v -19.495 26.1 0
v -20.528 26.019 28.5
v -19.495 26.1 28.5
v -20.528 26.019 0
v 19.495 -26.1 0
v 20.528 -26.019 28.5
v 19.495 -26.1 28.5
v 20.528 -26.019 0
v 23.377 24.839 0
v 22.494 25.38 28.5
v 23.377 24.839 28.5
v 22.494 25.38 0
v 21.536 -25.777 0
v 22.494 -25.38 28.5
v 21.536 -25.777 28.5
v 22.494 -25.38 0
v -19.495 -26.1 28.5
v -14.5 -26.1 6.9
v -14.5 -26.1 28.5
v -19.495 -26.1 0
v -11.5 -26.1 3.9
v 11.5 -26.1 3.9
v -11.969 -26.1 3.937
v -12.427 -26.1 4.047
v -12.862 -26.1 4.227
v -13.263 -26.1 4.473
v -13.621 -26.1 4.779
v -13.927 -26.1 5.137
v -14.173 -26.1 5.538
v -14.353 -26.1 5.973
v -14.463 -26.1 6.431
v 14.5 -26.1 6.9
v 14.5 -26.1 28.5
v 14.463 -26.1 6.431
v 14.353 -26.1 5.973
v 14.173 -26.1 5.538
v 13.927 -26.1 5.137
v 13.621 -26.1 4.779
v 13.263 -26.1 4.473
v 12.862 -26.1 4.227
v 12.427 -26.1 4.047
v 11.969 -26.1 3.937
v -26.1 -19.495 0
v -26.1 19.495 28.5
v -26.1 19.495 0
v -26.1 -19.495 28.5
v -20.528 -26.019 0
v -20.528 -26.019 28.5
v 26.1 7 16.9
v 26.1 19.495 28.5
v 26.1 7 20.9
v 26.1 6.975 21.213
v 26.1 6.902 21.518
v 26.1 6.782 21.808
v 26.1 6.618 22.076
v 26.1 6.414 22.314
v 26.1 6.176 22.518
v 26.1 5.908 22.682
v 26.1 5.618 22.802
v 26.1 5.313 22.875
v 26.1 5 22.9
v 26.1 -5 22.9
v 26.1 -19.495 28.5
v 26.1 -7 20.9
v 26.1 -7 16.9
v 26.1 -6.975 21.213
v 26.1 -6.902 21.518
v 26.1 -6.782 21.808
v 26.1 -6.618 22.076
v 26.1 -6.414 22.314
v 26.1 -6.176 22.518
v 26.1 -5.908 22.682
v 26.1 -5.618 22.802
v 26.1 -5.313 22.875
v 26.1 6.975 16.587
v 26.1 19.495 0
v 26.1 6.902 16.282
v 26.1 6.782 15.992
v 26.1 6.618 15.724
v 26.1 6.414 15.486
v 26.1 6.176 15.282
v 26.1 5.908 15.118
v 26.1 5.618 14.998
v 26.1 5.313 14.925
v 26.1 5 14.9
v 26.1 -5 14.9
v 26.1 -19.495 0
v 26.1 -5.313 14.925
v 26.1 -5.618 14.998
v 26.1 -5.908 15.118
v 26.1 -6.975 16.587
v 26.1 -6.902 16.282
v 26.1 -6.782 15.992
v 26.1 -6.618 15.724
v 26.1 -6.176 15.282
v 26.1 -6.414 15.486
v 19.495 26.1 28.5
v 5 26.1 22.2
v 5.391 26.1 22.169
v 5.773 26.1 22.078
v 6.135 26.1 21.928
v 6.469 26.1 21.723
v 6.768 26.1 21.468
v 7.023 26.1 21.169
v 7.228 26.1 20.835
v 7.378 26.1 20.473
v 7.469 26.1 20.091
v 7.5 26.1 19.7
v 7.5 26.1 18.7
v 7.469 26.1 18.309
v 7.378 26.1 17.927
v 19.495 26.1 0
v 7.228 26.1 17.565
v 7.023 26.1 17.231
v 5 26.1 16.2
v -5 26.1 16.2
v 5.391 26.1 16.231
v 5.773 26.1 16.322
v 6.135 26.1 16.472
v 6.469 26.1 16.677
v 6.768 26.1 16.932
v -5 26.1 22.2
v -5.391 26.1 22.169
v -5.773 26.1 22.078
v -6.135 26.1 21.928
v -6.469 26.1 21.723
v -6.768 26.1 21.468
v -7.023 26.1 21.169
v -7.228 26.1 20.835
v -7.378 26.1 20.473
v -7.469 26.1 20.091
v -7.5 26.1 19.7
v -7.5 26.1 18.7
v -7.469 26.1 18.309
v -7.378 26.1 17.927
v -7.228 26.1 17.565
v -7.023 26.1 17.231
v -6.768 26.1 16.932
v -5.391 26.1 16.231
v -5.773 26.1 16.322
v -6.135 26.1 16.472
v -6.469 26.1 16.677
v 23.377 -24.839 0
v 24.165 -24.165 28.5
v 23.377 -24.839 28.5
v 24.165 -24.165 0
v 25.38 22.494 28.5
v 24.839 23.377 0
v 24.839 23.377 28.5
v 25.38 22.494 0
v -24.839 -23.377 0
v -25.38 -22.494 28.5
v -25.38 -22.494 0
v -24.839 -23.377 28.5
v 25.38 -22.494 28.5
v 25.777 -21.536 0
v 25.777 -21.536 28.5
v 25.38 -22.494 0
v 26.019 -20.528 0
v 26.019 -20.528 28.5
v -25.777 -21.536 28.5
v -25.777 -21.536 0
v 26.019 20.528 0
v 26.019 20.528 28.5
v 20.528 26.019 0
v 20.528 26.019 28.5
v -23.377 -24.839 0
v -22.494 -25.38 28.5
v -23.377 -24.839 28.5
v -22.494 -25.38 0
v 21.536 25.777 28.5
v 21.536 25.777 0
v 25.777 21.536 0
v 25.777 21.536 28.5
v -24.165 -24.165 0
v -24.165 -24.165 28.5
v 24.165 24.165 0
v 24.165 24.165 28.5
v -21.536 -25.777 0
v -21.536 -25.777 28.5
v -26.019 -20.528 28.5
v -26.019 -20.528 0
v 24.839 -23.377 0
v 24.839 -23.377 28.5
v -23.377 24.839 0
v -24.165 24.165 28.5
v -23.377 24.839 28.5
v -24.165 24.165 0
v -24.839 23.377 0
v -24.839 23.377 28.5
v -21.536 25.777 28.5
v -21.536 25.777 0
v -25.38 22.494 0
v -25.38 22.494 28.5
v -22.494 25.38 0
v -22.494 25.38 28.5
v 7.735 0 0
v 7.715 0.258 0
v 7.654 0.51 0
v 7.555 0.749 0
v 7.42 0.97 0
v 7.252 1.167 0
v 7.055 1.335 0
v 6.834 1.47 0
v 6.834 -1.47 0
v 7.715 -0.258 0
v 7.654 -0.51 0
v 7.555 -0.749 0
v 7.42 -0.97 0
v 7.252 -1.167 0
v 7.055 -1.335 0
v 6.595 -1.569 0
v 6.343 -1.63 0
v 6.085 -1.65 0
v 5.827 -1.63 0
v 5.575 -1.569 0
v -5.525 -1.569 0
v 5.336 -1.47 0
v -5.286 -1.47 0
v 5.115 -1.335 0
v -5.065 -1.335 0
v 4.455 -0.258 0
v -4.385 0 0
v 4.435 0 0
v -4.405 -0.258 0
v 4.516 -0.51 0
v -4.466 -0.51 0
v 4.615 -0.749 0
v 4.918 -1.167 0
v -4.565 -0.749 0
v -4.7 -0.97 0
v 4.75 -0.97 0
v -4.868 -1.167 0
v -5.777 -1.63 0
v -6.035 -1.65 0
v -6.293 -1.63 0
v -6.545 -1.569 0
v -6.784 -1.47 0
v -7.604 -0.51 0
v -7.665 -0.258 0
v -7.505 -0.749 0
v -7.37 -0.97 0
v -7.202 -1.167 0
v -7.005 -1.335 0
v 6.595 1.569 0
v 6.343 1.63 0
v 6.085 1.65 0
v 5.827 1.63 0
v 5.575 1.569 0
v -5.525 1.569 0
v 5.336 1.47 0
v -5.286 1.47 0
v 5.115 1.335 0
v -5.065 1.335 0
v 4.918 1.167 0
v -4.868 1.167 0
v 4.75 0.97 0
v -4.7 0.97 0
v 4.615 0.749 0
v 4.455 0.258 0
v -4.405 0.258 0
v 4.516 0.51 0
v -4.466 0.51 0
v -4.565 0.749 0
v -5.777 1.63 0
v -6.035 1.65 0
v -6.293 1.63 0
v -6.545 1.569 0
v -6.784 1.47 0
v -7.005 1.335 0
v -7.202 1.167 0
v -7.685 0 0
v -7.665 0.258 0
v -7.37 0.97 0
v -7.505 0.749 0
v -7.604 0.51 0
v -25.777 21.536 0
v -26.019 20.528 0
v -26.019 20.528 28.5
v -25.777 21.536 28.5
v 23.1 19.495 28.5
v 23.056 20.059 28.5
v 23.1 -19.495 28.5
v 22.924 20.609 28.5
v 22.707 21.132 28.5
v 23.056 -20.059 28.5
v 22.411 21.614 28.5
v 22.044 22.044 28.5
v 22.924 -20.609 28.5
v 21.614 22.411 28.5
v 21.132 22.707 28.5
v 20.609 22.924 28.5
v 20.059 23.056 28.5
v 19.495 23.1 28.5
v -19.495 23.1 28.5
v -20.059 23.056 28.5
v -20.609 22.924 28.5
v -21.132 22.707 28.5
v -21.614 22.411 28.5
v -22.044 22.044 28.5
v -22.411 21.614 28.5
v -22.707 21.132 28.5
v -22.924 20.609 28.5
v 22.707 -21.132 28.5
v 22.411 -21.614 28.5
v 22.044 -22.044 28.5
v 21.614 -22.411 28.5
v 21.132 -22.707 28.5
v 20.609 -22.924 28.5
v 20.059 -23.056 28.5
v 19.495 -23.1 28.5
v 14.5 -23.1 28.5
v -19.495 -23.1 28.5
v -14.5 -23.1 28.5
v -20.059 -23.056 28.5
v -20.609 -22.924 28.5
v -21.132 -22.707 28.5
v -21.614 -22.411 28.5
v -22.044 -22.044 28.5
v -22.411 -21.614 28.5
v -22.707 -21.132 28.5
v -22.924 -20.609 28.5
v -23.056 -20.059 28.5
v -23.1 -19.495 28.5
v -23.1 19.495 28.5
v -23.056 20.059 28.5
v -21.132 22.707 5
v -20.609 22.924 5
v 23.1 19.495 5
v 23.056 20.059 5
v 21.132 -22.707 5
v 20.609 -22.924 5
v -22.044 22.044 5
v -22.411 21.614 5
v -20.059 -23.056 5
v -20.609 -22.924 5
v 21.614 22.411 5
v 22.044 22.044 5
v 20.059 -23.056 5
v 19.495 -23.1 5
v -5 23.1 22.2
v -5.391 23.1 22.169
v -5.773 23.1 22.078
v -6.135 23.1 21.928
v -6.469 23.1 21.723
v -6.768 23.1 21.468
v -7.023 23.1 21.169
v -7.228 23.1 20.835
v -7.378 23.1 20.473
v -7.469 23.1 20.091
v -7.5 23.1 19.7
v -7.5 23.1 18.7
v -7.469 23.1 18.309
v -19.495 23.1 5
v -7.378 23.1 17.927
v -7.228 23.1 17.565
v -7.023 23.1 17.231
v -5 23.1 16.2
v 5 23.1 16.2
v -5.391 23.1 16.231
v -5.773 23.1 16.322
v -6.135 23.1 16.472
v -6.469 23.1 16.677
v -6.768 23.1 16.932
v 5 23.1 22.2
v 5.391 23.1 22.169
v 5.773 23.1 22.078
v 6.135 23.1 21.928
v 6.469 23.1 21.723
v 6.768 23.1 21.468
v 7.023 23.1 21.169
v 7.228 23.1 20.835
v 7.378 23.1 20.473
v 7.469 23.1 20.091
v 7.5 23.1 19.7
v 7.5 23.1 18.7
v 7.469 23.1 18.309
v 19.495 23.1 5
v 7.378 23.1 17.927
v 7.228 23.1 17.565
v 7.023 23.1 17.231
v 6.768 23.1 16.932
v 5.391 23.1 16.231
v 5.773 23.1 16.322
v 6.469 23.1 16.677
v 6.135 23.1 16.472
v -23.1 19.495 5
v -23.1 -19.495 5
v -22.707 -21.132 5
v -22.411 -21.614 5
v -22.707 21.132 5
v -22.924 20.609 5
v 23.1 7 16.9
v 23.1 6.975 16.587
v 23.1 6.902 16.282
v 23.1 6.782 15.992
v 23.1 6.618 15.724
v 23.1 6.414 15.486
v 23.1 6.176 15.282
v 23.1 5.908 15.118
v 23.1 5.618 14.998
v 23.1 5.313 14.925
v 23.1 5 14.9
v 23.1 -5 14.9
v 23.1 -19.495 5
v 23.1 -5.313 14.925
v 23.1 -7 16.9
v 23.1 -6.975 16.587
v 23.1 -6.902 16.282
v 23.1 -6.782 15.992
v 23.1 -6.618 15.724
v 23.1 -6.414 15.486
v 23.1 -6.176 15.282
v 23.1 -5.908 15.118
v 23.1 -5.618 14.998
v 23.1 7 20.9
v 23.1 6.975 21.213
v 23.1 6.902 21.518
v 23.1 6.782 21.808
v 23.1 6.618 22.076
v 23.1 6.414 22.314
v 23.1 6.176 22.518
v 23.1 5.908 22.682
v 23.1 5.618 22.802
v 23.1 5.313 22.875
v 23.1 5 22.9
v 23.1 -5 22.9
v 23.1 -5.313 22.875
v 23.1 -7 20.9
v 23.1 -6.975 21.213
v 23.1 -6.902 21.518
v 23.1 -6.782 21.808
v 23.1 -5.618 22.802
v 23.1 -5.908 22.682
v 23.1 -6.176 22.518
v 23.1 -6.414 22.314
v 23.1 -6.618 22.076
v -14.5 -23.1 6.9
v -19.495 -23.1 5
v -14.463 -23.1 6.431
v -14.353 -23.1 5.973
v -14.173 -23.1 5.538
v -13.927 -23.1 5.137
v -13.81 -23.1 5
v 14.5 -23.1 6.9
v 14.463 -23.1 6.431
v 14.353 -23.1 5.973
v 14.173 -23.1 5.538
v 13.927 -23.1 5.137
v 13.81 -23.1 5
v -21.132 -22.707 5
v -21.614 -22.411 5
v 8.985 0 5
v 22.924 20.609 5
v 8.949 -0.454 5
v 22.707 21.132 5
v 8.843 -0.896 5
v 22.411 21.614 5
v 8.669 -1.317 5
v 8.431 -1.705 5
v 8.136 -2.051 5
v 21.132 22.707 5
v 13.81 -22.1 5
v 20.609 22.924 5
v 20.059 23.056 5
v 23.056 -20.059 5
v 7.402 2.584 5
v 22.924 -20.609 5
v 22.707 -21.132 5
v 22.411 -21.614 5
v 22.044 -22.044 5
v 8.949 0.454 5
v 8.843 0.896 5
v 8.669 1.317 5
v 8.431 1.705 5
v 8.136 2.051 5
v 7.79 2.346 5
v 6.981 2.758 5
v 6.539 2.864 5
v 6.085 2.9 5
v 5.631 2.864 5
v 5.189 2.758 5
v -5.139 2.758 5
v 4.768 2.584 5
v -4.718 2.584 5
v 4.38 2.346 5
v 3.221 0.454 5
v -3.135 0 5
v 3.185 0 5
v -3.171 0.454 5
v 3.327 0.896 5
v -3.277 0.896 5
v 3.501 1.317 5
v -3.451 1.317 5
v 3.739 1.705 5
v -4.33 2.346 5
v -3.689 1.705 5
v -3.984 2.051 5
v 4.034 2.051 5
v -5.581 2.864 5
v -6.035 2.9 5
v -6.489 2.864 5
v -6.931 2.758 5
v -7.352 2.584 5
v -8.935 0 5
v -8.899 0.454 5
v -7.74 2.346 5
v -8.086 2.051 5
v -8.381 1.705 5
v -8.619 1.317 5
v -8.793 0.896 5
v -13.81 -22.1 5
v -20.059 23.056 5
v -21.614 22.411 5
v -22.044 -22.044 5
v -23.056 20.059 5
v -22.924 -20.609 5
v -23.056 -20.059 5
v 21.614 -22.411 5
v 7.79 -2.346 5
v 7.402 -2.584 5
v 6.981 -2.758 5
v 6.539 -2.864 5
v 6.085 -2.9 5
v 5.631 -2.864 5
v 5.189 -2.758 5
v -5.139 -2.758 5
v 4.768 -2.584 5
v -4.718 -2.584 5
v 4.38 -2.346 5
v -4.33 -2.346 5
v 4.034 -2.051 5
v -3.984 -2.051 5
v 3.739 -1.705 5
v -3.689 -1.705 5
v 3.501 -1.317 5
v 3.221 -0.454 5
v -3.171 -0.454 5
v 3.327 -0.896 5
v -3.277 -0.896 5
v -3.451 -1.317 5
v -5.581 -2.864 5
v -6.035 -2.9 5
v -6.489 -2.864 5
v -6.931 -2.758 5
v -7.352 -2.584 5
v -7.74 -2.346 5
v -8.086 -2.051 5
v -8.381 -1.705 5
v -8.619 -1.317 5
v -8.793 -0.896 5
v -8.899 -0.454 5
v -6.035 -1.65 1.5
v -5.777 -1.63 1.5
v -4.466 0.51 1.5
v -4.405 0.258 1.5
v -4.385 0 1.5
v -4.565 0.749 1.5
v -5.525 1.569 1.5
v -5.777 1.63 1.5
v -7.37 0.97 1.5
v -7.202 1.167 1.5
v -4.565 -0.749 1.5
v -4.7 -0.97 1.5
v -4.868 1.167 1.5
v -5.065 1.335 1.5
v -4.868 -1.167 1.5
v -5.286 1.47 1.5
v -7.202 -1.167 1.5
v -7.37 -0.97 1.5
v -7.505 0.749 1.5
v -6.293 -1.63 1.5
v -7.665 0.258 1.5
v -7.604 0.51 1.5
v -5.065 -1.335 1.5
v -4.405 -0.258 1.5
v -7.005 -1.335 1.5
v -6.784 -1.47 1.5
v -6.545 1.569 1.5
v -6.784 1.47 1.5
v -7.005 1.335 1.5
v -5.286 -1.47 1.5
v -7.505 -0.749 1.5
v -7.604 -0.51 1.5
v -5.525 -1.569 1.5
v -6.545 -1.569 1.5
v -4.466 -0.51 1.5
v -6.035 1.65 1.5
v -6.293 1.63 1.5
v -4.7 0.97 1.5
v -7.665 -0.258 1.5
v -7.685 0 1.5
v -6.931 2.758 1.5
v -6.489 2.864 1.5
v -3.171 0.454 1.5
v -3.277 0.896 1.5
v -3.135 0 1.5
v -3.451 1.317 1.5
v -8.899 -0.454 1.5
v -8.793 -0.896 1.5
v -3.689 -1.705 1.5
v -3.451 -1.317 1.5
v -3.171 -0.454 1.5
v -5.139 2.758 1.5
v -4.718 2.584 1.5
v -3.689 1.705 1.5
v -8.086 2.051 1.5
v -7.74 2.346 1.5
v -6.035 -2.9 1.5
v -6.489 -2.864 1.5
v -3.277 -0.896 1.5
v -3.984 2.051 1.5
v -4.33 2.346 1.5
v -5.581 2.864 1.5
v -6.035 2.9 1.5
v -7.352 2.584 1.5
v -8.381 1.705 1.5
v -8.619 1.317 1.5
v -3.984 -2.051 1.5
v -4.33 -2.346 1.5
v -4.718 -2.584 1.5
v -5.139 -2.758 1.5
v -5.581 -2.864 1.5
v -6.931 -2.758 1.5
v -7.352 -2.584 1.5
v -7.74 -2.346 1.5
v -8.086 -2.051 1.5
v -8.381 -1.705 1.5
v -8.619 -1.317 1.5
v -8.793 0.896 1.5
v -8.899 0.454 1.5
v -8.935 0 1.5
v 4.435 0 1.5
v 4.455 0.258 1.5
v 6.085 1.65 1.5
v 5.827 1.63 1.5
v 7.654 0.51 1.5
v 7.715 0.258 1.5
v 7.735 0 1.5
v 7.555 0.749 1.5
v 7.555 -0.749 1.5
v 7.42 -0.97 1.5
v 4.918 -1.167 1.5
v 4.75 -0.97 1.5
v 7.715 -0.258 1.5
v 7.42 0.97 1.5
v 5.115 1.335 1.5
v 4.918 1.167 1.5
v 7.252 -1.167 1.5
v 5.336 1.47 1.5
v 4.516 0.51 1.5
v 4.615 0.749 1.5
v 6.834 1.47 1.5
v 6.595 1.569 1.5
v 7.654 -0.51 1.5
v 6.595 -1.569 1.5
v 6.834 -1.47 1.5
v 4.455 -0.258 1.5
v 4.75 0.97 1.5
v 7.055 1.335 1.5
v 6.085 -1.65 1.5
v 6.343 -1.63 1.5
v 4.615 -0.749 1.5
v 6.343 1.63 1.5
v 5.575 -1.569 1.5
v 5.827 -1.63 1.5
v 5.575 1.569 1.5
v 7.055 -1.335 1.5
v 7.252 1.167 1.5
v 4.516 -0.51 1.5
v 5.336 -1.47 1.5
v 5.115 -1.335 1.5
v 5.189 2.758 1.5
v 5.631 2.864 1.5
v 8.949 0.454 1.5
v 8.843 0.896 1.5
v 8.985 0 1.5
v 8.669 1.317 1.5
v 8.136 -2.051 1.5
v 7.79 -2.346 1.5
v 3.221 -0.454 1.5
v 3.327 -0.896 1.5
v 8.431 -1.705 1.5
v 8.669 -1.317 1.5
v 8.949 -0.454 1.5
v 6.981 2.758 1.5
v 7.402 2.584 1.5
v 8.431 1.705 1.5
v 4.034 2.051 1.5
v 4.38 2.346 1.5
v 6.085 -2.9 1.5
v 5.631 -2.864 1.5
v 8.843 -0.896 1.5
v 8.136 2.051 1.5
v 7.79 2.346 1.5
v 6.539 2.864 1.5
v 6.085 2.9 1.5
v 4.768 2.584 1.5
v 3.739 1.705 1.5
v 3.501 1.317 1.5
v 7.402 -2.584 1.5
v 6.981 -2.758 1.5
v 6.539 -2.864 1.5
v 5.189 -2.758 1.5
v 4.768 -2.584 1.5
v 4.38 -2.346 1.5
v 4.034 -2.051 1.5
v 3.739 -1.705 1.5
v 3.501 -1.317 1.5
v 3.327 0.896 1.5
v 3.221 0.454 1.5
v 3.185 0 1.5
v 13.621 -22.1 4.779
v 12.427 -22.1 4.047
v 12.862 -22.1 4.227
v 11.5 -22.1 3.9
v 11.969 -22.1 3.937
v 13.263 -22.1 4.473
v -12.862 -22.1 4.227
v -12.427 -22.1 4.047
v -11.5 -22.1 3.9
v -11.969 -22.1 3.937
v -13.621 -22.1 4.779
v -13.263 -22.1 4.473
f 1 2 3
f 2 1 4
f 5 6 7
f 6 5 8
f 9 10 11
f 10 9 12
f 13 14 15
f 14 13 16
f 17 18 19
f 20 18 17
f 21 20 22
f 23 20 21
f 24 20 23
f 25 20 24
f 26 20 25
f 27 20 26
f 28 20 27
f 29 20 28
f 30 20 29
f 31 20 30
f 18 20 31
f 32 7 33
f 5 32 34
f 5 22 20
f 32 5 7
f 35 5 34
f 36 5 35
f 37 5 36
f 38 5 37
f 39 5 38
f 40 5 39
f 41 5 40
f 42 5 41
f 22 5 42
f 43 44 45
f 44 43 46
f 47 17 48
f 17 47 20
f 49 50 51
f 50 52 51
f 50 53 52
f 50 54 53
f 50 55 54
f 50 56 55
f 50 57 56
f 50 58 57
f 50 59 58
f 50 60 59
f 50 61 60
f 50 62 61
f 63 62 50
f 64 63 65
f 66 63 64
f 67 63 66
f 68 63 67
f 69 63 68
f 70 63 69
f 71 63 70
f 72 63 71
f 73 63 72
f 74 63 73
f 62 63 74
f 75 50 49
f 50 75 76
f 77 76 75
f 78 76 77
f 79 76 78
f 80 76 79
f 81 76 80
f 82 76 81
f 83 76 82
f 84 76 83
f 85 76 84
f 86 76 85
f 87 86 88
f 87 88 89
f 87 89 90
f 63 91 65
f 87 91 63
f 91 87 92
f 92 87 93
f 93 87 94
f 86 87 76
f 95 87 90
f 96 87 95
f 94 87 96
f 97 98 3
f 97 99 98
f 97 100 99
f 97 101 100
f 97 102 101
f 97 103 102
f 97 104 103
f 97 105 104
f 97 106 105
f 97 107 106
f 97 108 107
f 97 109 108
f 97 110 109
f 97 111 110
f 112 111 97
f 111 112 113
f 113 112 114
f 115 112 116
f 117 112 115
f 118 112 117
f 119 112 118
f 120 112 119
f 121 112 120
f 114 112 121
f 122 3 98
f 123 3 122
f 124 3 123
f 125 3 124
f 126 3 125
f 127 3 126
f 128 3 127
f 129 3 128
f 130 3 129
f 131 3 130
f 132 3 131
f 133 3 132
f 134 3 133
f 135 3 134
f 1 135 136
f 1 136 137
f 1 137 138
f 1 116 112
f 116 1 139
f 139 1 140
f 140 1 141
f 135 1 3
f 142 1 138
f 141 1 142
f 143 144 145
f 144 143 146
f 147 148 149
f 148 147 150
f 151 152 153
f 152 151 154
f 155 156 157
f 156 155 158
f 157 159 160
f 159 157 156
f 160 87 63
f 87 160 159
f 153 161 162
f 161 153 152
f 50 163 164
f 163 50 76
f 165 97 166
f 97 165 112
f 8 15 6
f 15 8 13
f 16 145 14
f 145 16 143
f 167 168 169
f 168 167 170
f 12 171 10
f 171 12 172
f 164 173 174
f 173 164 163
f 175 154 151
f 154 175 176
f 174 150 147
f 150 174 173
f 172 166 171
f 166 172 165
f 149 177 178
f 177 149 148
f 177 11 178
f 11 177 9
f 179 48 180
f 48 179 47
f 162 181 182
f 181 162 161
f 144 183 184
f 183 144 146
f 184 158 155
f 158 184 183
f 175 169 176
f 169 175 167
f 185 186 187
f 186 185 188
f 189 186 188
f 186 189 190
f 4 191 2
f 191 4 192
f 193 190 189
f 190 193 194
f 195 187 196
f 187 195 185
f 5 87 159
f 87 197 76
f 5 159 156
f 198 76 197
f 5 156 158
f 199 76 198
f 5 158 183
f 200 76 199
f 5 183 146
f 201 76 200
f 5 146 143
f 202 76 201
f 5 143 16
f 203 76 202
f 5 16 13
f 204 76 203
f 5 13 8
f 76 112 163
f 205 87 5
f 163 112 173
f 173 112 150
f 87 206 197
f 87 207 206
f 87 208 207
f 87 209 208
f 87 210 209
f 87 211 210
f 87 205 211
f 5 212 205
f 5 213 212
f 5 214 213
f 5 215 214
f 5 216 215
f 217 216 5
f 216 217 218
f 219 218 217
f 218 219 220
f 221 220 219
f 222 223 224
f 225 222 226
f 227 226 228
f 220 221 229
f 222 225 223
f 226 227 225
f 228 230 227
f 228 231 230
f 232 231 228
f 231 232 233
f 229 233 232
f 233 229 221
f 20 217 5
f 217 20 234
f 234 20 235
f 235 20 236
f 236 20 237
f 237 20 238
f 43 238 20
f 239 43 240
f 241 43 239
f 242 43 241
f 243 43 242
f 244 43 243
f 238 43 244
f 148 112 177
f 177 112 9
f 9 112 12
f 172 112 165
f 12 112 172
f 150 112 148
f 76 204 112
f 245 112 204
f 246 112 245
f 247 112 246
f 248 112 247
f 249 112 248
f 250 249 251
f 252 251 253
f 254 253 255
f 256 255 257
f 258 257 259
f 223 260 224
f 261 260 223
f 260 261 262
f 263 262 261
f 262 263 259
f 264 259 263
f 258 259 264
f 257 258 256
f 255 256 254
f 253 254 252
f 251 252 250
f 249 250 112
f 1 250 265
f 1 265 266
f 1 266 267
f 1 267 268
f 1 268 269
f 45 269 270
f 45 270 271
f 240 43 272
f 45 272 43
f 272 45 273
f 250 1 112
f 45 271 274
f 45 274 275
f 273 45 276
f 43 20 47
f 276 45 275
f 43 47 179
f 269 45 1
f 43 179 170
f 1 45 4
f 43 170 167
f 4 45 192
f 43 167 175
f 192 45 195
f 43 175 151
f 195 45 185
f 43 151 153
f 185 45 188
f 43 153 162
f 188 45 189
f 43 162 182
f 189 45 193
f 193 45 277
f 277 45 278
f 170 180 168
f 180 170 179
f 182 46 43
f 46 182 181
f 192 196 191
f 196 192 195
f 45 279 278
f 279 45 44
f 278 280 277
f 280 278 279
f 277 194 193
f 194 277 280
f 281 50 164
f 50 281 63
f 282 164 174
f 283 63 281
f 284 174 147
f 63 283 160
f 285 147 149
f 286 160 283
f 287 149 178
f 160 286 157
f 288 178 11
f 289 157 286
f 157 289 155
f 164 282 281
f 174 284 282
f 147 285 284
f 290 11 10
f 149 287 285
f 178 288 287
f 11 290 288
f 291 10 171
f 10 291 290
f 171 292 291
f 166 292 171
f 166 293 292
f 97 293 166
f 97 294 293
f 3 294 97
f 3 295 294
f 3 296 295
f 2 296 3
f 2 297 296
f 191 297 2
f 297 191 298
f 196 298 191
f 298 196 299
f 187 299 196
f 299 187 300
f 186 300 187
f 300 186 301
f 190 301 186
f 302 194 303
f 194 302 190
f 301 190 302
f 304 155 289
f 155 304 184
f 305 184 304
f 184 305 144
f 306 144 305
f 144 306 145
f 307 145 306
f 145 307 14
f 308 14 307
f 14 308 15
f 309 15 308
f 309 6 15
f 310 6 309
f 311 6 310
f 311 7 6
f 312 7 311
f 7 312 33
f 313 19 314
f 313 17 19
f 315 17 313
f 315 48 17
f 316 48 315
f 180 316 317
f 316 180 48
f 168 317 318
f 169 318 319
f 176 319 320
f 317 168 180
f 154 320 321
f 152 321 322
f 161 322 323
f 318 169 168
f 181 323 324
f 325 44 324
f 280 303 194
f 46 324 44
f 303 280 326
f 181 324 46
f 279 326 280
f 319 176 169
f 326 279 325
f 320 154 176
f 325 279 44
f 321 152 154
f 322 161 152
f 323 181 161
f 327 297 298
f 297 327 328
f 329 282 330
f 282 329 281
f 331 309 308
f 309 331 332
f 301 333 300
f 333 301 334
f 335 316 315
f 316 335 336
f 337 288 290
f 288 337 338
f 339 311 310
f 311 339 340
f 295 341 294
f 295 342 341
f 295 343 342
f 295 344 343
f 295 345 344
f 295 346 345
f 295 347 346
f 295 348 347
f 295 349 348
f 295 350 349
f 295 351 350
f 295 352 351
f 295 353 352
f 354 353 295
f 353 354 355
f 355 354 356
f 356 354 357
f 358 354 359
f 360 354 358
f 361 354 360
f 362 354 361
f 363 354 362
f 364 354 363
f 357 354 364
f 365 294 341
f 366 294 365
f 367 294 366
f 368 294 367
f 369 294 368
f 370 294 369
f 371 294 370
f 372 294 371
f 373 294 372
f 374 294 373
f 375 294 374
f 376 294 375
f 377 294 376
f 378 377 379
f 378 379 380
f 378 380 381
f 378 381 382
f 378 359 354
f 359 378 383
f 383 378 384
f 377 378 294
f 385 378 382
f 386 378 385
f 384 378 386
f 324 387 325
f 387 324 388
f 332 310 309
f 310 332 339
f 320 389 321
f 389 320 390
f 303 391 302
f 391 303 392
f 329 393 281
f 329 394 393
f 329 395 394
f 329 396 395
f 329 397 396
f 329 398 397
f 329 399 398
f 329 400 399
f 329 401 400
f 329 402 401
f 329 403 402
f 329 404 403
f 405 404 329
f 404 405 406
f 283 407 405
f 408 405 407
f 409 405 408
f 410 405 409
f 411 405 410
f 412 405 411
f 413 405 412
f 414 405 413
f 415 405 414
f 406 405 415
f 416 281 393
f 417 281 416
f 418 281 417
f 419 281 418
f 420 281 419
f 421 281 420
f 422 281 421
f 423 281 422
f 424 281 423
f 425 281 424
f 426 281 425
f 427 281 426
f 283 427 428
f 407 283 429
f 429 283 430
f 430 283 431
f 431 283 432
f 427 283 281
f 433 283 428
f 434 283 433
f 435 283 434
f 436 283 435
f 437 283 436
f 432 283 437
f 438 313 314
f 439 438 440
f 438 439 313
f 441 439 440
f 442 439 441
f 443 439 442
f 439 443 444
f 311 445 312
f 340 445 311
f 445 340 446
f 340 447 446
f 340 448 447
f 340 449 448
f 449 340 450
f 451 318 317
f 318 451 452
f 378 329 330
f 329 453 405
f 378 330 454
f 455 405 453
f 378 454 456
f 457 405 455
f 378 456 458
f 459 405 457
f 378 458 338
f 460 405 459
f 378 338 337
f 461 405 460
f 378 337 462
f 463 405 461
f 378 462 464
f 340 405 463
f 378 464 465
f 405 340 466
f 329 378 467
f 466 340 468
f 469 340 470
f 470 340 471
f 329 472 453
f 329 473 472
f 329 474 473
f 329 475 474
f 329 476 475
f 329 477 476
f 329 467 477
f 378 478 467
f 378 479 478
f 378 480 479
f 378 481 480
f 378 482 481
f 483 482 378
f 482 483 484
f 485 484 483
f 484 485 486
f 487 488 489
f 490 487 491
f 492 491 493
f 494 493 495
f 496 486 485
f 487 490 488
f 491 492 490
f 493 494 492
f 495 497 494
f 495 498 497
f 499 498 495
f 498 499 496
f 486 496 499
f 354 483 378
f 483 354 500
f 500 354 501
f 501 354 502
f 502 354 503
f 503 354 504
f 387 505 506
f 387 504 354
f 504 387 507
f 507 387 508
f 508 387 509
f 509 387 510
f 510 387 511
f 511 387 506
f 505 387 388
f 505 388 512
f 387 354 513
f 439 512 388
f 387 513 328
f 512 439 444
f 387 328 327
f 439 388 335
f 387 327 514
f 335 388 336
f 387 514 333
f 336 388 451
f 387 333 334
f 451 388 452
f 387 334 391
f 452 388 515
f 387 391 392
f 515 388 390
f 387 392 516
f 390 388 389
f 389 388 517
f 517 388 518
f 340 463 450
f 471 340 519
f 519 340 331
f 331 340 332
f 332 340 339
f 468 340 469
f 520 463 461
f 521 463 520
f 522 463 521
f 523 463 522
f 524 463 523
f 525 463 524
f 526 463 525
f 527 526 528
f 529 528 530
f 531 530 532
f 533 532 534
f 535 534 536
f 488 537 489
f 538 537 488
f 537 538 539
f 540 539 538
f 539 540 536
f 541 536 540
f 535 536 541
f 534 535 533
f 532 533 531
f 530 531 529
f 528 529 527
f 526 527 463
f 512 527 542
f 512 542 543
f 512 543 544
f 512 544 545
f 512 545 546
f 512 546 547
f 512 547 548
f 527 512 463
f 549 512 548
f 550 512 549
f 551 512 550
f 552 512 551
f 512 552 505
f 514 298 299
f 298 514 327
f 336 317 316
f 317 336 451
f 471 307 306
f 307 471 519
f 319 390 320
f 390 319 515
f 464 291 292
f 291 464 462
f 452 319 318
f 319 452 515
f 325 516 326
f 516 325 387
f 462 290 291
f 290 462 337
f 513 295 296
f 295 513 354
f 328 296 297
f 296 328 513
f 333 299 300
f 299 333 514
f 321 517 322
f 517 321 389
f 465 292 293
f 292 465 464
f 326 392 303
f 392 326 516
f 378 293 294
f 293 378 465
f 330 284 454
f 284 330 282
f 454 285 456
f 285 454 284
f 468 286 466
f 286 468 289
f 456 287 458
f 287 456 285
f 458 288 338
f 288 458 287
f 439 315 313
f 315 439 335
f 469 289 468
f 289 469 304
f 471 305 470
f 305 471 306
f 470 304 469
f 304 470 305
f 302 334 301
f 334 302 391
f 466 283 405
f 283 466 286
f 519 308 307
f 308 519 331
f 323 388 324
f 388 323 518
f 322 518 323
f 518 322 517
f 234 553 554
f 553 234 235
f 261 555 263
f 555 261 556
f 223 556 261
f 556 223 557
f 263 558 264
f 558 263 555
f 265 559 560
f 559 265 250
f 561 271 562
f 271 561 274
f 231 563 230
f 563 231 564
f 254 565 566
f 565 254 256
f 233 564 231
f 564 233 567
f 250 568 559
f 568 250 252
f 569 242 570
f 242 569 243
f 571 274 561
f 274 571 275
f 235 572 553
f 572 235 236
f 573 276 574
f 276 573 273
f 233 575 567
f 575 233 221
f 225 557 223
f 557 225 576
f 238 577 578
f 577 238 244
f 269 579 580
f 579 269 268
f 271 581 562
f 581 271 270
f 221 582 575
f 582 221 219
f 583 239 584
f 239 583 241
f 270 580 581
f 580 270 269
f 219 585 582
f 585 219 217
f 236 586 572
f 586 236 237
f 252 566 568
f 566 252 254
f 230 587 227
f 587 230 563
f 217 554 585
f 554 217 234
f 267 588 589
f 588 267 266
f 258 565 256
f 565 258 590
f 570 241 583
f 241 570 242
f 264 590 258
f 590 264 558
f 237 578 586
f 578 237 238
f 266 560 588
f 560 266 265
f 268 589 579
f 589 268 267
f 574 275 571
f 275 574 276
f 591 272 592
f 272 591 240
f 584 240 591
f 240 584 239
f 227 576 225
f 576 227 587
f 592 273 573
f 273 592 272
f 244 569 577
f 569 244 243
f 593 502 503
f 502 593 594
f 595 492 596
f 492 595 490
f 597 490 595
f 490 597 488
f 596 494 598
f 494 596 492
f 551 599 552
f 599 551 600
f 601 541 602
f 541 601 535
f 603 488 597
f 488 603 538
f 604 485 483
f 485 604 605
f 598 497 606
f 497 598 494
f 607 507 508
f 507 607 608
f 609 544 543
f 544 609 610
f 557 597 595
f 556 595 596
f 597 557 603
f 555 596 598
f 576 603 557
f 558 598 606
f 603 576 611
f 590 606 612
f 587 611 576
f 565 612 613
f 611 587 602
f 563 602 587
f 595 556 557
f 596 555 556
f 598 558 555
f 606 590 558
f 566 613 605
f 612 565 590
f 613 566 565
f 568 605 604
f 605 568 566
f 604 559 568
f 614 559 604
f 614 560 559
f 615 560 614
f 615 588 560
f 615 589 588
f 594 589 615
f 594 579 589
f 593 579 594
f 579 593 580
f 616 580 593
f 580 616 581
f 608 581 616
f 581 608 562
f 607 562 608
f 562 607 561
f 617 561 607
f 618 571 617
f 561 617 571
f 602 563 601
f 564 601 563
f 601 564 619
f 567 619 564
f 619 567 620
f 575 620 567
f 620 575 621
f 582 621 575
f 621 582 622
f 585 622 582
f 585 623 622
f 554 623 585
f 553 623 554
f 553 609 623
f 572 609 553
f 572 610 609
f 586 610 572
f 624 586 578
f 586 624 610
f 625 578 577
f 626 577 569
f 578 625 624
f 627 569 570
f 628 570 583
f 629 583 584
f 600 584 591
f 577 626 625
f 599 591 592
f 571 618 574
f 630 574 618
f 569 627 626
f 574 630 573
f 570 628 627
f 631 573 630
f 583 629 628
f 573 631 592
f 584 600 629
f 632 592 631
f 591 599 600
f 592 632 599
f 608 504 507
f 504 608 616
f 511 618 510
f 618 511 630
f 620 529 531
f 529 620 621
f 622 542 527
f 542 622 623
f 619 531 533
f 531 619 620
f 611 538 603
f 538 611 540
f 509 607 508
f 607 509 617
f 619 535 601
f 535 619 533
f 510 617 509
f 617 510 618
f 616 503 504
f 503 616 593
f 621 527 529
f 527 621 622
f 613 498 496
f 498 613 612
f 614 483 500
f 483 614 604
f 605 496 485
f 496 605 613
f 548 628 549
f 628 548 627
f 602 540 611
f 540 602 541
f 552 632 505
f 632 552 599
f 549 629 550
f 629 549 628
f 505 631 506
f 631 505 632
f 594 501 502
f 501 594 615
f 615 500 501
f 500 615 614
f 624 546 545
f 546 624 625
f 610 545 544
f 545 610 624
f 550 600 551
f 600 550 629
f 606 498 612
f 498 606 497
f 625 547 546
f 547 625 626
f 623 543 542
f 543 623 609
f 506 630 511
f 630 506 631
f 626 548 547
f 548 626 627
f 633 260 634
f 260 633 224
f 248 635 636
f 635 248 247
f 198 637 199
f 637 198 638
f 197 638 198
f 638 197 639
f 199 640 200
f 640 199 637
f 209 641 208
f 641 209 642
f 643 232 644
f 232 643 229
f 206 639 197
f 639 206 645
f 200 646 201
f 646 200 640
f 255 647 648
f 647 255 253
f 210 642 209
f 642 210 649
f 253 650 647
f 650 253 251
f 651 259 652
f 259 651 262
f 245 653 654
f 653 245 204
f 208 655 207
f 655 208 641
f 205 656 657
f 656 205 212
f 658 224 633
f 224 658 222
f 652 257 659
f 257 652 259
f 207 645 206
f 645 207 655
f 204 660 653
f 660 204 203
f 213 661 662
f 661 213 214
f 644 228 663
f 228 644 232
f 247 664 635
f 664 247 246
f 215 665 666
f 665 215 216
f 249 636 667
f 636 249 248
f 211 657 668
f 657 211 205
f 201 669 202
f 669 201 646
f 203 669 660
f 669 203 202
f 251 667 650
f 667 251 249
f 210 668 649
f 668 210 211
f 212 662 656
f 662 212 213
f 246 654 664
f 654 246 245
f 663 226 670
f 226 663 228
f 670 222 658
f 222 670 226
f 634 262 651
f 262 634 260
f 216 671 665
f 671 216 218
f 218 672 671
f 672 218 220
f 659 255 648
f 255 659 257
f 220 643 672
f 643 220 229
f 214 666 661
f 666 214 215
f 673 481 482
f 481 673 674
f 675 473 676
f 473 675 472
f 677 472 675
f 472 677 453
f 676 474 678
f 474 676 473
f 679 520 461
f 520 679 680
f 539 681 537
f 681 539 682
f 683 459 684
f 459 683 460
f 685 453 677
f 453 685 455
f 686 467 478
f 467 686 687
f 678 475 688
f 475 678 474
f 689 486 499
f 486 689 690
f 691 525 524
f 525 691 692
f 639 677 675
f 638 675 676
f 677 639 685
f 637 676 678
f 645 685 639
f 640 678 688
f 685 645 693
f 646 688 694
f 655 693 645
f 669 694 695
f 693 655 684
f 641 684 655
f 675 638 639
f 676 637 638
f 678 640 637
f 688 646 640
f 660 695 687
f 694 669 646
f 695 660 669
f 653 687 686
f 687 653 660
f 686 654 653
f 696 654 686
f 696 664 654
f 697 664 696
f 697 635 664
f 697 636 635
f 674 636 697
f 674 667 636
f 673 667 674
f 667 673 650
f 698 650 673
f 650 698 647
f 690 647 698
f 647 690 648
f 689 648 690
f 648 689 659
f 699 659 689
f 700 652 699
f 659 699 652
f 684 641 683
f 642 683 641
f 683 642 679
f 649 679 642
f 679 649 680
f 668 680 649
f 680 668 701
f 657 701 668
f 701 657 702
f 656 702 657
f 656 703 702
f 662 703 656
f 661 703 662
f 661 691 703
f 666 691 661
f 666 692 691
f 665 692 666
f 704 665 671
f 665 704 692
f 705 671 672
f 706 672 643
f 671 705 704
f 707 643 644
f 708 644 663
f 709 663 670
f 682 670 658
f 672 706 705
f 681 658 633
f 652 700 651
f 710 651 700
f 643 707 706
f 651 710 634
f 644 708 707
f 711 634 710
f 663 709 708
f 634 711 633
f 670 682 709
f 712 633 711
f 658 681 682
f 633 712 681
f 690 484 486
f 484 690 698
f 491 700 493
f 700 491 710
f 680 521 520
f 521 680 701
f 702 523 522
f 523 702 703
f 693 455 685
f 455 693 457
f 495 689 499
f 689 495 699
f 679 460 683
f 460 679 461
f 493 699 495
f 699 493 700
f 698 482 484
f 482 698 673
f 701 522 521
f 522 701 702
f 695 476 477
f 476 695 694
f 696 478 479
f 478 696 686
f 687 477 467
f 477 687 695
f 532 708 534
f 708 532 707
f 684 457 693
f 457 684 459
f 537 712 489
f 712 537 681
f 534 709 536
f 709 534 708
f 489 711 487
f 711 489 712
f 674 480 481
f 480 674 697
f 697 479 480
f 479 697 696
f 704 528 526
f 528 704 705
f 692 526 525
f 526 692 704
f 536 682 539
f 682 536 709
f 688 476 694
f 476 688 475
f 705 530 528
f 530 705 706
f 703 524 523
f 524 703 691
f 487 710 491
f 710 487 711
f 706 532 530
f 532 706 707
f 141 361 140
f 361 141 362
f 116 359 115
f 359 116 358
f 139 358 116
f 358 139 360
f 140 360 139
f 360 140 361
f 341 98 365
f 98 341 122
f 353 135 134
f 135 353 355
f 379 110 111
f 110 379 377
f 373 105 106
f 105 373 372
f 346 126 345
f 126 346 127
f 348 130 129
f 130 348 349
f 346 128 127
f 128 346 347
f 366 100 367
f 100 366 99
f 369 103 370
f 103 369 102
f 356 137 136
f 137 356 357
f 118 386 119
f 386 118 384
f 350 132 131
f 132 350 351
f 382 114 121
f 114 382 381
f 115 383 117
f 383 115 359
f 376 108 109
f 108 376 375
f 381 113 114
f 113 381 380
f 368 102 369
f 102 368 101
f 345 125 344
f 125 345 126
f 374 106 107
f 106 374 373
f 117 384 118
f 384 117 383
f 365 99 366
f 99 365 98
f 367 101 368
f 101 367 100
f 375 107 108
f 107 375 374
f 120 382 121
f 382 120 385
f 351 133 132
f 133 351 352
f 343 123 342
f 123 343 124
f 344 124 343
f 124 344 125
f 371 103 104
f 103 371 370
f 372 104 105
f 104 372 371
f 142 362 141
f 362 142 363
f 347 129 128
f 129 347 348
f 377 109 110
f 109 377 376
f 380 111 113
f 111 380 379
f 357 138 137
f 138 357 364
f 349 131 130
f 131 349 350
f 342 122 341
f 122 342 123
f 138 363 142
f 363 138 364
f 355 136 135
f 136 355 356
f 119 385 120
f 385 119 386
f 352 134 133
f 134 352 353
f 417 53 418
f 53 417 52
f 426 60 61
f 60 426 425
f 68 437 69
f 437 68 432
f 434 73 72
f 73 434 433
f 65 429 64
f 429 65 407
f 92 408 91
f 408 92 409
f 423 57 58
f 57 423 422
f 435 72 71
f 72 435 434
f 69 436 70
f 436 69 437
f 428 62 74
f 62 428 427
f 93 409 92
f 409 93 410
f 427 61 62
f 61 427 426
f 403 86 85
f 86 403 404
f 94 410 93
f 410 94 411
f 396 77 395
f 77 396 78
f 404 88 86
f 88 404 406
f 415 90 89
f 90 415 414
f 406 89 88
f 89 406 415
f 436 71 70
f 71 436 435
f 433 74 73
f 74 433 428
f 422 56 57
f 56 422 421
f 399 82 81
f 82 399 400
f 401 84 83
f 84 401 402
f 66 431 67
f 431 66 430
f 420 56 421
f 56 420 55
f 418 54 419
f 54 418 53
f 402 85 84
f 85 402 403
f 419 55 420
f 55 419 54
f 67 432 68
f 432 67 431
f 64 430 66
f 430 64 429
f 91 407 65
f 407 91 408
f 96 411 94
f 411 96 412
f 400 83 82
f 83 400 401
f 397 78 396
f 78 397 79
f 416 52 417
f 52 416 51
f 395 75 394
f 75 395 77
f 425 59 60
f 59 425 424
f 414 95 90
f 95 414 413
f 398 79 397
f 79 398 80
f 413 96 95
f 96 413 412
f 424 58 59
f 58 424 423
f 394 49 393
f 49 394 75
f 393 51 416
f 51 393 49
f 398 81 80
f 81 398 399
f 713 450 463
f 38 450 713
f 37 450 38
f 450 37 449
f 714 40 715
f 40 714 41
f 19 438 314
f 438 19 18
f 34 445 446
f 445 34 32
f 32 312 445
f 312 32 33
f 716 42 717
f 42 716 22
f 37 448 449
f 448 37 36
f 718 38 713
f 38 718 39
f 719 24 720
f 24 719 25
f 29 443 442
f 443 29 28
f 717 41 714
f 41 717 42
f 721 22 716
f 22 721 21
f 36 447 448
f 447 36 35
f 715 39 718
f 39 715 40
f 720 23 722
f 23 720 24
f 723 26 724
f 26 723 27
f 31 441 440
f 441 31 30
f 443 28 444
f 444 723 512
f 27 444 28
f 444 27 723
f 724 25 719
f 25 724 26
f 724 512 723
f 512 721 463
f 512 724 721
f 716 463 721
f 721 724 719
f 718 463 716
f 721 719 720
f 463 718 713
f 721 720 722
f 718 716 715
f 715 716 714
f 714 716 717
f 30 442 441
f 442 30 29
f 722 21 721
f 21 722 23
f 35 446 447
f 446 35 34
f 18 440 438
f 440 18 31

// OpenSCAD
/*
  Cold-shoe mount for a 43.3 x 43.3 x 22.5 mm device
  (rounded corners; straight edge between them is 38.99 mm)

  Two printed parts, selected with `part`:
    1 = shoe_mount()    the cold shoe mount: 25 x 30 plate, 3.5 mm capture
                        lip, M3 tap recess in the middle
    2 = pocket()        the pocket the device drops into; grips the device
                        by friction fit
    3 = both, assembled

  How it holds:
    - the device drops into the pocket from the top (screen facing up) and
      is gripped by the walls (friction fit, set with `fit`)
    - the pocket is screwed to the mount with one M3 SHCS: its head sits
      recessed in the pocket floor (below the device) and its tip threads
      into a blind tap recess in the mount's top face

  Assembly order:
    1. tap the recess in the mount with an M3 tap
    2. seat the mount in the camera cold shoe (lip end first)
    3. place the pocket on the mount and screw in the M3 SHCS from above
       (the head recesses into the floor, flush below where the device sits)
    4. drop the device into the pocket

  Tuning the fit: FDM printers usually run slightly large, so the default
    fit = -0.2 (pocket 0.1 mm smaller per side than the device) typically
    lands as a tight friction fit you can push in by hand and pull out
    with a firm tug. If your printer runs small, try 0 (line-to-line) or
    0.2 (loose drop-in).

  Printing: each part prints with its flat face down, no supports needed.

  Wall layout (top view, screen facing up):
    front (-y) : 3 buttons      back (+y) : microSD slot
    left  (-x) : plain          right (+x): USB-C
  The shoe lip is on the USB side by default; flip it with lip_side.
*/

$fn = 40;

// ================= Part selector =================
part = 2;   // 1 = cold shoe mount, 2 = pocket, 3 = both

// ================= Device =================
obj_w     = 46.6;    // width
obj_d     = 46.6;    // depth
obj_h     = 22.5;    // height
obj_flat  = 38.99;   // straight edge between the rounded corners
obj_r     = (obj_w - obj_flat) / 2;   // device corner radius (2.155)

// ================= Pocket (part 2) =================
// Friction fit: 0 = line-to-line, negative = interference (grip),
// positive = clearance (loose). See the note above.
fit     = -0.2;
wall_t  = 3;         // wall thickness
floor_t = 5;         // pocket floor thickness (thick enough for a blind head recess)
wall_lip = 1;        // wall height above the device top (grip lip)

inner_w = obj_w + 2 * fit;
inner_d = obj_d + 2 * fit;
outer_w = inner_w + 2 * wall_t;
outer_d = inner_d + 2 * wall_t;
inner_r = obj_r + fit;
outer_r = inner_r + wall_t;
wall_h  = obj_h + wall_lip;   // wall height above the floor's top face

// --- access cutouts -----------------------------------------------------
// each cutout: [width, height, height of its centre from the device top,
//               offset of its centre along the wall from the wall's centre]
usb_cut = [14, 8, 8.6, 0];    // USB-C, right wall (+x)
usb_r   = 2;                  // USB-C window corner radius (rounded rectangle)
sd_cut  = [15, 6, 8.3, 0];    // microSD slot, back wall (+y) - widened for easy removal
sd_r    = 2.5;                // microSD window corner radius (rounded rectangle)

// one large rounded-rect window covering the whole button row, front wall (-y):
//   width  = 2 pitches (10 mm) + 6 mm = 26 mm
//   height = twice the old single holes (6 mm -> 12 mm), centred on the buttons
btn_win_w  = 29;
btn_win_h  = 28;
btn_win_r  = 3;               // corner radius
btn_z      = 9.6;             // window centre = button centre, measured down from the device top
btn_pitch  = 10;              // button pitch (useful when tuning the window width)

// --- joint to the cold shoe mount ---------------------------------------
// One M3 SHCS joins the pocket to the mount: head recessed in the pocket
// floor (below the device), tip threaded into a blind tap recess in the mount.
tap_d        = 2.6;         // mount tap recess: M3 (3.0 for a self-tapper)
tap_dep      = 2.0;         // tap-recess depth into the mount plate
screw_hole_d = 3.3;         // shank clearance hole through the pocket floor
csbore_d     = 5.8;         // head-recess (counterbore) diameter
screw_head_h = 2.5;         // M3 SHCS head height
screw_recess = 1.0;         // head top sits this far BELOW the floor's top face
csbore_t     = screw_head_h + screw_recess;  // head-recess depth (blind, not through)

// ================= Cold shoe mount (part 1) =================
base_w   = 25;
base_d   = 30;
base_t   = 3;
lip_h    = 3.5;    // capture-lip height (camera-shoe standard)
lip_len  = 2;      // lip depth along the plate
base_r   = 1;      // plate corner round
lip_side = 1;      // 1 = lip on the +y (USB) side, -1 = on the -y (button) side

// ================= Helpers =================

// 2D rounded rectangle, w x d, corner radius r, centred on the origin
module rounded_rect(w, d, r) {
  union() {
    square([w - 2 * r, d], true);
    square([w, d - 2 * r], true);
    for (sx = [-1, 1])
      for (sy = [-1, 1])
        translate([sx * (w / 2 - r), sy * (d / 2 - r)])
          circle(r);
  }
}

// ================= Part 1: cold shoe mount =================
module shoe_mount() {
  difference() {
    union() {
      // main plate
      linear_extrude(base_t)
        rounded_rect(base_w, base_d, base_r);
      // capture lip: 0.5 mm proud band on one end of the plate
      translate([0, lip_side * (base_d / 2 - lip_len / 2), lip_h / 2])
        cube([base_w, lip_len, lip_h], true);
    }
    // blind M3 tap recess in the top face: the screw tip seats flush in this
    translate([0, 0, base_t - tap_dep])
      cylinder(h = tap_dep, d = tap_d);
  }
}

// ================= Part 2: pocket =================
module pocket() {
  difference() {
    union() {
      // floor
      linear_extrude(floor_t)
        rounded_rect(outer_w, outer_d, outer_r);
      // walls, rising from the floor's top face
      translate([0, 0, floor_t])
        linear_extrude(wall_h)
          rounded_rect(outer_w, outer_d, outer_r);
    }

    // the pocket cavity the device drops into, open at the top
    translate([0, 0, floor_t])
      linear_extrude(wall_h)
        rounded_rect(inner_w, inner_d, inner_r);

    // shank clearance hole through the floor, plus a blind head recess at the
    // top face (the screw head sits recessed in it, below the device)
    translate([-5.91-0.125, 0, 0])
    cylinder(h = floor_t, d = screw_hole_d);
    translate([-5.91-0.125, 0, floor_t - csbore_t])
      cylinder(h = csbore_t, d = csbore_d);


   // shank clearance hole through the floor, plus a blind head recess at the
    // top face (the screw head sits recessed in it, below the device)
    translate([5.91+0.125+0.05, 0, 0])
    cylinder(h = floor_t, d = screw_hole_d);
    translate([5.91+0.125+0.05, 0, floor_t - csbore_t])
      cylinder(h = csbore_t, d = csbore_d);

    // microSD slot cutout, back wall (+y): rounded rectangle
    translate([sd_cut[3], inner_d / 2 - 1, floor_t + (obj_h - sd_cut[2])])
      rotate([-90, 0, 0])
        linear_extrude(wall_t + 2)
          rounded_rect(sd_cut[0], sd_cut[1], sd_r);

    // USB-C cutout, right wall (+x): rounded rectangle
    translate([4+ inner_d / 2, usb_cut[3], floor_t + (obj_h - usb_cut[2])])
      rotate([90, 0, 0])
        rotate([0, -90, 0])
          linear_extrude(wall_t + 2)
            rounded_rect(usb_cut[0], usb_cut[1], usb_r);

    // button window, front wall (-y): one large rounded rectangle
    translate([0, 1 - inner_d / 2, floor_t + (obj_h - btn_z)])
      rotate([90, 0, 0])
        linear_extrude(wall_t + 2)
          rounded_rect(btn_win_w, btn_win_h, btn_win_r);
  }
}

// ================= Build =================
if (part == 1)
  shoe_mount();
else if (part == 2)
  pocket();
else
  union() {
    shoe_mount();
    translate([0, 0, base_t])
      pocket();
  }
